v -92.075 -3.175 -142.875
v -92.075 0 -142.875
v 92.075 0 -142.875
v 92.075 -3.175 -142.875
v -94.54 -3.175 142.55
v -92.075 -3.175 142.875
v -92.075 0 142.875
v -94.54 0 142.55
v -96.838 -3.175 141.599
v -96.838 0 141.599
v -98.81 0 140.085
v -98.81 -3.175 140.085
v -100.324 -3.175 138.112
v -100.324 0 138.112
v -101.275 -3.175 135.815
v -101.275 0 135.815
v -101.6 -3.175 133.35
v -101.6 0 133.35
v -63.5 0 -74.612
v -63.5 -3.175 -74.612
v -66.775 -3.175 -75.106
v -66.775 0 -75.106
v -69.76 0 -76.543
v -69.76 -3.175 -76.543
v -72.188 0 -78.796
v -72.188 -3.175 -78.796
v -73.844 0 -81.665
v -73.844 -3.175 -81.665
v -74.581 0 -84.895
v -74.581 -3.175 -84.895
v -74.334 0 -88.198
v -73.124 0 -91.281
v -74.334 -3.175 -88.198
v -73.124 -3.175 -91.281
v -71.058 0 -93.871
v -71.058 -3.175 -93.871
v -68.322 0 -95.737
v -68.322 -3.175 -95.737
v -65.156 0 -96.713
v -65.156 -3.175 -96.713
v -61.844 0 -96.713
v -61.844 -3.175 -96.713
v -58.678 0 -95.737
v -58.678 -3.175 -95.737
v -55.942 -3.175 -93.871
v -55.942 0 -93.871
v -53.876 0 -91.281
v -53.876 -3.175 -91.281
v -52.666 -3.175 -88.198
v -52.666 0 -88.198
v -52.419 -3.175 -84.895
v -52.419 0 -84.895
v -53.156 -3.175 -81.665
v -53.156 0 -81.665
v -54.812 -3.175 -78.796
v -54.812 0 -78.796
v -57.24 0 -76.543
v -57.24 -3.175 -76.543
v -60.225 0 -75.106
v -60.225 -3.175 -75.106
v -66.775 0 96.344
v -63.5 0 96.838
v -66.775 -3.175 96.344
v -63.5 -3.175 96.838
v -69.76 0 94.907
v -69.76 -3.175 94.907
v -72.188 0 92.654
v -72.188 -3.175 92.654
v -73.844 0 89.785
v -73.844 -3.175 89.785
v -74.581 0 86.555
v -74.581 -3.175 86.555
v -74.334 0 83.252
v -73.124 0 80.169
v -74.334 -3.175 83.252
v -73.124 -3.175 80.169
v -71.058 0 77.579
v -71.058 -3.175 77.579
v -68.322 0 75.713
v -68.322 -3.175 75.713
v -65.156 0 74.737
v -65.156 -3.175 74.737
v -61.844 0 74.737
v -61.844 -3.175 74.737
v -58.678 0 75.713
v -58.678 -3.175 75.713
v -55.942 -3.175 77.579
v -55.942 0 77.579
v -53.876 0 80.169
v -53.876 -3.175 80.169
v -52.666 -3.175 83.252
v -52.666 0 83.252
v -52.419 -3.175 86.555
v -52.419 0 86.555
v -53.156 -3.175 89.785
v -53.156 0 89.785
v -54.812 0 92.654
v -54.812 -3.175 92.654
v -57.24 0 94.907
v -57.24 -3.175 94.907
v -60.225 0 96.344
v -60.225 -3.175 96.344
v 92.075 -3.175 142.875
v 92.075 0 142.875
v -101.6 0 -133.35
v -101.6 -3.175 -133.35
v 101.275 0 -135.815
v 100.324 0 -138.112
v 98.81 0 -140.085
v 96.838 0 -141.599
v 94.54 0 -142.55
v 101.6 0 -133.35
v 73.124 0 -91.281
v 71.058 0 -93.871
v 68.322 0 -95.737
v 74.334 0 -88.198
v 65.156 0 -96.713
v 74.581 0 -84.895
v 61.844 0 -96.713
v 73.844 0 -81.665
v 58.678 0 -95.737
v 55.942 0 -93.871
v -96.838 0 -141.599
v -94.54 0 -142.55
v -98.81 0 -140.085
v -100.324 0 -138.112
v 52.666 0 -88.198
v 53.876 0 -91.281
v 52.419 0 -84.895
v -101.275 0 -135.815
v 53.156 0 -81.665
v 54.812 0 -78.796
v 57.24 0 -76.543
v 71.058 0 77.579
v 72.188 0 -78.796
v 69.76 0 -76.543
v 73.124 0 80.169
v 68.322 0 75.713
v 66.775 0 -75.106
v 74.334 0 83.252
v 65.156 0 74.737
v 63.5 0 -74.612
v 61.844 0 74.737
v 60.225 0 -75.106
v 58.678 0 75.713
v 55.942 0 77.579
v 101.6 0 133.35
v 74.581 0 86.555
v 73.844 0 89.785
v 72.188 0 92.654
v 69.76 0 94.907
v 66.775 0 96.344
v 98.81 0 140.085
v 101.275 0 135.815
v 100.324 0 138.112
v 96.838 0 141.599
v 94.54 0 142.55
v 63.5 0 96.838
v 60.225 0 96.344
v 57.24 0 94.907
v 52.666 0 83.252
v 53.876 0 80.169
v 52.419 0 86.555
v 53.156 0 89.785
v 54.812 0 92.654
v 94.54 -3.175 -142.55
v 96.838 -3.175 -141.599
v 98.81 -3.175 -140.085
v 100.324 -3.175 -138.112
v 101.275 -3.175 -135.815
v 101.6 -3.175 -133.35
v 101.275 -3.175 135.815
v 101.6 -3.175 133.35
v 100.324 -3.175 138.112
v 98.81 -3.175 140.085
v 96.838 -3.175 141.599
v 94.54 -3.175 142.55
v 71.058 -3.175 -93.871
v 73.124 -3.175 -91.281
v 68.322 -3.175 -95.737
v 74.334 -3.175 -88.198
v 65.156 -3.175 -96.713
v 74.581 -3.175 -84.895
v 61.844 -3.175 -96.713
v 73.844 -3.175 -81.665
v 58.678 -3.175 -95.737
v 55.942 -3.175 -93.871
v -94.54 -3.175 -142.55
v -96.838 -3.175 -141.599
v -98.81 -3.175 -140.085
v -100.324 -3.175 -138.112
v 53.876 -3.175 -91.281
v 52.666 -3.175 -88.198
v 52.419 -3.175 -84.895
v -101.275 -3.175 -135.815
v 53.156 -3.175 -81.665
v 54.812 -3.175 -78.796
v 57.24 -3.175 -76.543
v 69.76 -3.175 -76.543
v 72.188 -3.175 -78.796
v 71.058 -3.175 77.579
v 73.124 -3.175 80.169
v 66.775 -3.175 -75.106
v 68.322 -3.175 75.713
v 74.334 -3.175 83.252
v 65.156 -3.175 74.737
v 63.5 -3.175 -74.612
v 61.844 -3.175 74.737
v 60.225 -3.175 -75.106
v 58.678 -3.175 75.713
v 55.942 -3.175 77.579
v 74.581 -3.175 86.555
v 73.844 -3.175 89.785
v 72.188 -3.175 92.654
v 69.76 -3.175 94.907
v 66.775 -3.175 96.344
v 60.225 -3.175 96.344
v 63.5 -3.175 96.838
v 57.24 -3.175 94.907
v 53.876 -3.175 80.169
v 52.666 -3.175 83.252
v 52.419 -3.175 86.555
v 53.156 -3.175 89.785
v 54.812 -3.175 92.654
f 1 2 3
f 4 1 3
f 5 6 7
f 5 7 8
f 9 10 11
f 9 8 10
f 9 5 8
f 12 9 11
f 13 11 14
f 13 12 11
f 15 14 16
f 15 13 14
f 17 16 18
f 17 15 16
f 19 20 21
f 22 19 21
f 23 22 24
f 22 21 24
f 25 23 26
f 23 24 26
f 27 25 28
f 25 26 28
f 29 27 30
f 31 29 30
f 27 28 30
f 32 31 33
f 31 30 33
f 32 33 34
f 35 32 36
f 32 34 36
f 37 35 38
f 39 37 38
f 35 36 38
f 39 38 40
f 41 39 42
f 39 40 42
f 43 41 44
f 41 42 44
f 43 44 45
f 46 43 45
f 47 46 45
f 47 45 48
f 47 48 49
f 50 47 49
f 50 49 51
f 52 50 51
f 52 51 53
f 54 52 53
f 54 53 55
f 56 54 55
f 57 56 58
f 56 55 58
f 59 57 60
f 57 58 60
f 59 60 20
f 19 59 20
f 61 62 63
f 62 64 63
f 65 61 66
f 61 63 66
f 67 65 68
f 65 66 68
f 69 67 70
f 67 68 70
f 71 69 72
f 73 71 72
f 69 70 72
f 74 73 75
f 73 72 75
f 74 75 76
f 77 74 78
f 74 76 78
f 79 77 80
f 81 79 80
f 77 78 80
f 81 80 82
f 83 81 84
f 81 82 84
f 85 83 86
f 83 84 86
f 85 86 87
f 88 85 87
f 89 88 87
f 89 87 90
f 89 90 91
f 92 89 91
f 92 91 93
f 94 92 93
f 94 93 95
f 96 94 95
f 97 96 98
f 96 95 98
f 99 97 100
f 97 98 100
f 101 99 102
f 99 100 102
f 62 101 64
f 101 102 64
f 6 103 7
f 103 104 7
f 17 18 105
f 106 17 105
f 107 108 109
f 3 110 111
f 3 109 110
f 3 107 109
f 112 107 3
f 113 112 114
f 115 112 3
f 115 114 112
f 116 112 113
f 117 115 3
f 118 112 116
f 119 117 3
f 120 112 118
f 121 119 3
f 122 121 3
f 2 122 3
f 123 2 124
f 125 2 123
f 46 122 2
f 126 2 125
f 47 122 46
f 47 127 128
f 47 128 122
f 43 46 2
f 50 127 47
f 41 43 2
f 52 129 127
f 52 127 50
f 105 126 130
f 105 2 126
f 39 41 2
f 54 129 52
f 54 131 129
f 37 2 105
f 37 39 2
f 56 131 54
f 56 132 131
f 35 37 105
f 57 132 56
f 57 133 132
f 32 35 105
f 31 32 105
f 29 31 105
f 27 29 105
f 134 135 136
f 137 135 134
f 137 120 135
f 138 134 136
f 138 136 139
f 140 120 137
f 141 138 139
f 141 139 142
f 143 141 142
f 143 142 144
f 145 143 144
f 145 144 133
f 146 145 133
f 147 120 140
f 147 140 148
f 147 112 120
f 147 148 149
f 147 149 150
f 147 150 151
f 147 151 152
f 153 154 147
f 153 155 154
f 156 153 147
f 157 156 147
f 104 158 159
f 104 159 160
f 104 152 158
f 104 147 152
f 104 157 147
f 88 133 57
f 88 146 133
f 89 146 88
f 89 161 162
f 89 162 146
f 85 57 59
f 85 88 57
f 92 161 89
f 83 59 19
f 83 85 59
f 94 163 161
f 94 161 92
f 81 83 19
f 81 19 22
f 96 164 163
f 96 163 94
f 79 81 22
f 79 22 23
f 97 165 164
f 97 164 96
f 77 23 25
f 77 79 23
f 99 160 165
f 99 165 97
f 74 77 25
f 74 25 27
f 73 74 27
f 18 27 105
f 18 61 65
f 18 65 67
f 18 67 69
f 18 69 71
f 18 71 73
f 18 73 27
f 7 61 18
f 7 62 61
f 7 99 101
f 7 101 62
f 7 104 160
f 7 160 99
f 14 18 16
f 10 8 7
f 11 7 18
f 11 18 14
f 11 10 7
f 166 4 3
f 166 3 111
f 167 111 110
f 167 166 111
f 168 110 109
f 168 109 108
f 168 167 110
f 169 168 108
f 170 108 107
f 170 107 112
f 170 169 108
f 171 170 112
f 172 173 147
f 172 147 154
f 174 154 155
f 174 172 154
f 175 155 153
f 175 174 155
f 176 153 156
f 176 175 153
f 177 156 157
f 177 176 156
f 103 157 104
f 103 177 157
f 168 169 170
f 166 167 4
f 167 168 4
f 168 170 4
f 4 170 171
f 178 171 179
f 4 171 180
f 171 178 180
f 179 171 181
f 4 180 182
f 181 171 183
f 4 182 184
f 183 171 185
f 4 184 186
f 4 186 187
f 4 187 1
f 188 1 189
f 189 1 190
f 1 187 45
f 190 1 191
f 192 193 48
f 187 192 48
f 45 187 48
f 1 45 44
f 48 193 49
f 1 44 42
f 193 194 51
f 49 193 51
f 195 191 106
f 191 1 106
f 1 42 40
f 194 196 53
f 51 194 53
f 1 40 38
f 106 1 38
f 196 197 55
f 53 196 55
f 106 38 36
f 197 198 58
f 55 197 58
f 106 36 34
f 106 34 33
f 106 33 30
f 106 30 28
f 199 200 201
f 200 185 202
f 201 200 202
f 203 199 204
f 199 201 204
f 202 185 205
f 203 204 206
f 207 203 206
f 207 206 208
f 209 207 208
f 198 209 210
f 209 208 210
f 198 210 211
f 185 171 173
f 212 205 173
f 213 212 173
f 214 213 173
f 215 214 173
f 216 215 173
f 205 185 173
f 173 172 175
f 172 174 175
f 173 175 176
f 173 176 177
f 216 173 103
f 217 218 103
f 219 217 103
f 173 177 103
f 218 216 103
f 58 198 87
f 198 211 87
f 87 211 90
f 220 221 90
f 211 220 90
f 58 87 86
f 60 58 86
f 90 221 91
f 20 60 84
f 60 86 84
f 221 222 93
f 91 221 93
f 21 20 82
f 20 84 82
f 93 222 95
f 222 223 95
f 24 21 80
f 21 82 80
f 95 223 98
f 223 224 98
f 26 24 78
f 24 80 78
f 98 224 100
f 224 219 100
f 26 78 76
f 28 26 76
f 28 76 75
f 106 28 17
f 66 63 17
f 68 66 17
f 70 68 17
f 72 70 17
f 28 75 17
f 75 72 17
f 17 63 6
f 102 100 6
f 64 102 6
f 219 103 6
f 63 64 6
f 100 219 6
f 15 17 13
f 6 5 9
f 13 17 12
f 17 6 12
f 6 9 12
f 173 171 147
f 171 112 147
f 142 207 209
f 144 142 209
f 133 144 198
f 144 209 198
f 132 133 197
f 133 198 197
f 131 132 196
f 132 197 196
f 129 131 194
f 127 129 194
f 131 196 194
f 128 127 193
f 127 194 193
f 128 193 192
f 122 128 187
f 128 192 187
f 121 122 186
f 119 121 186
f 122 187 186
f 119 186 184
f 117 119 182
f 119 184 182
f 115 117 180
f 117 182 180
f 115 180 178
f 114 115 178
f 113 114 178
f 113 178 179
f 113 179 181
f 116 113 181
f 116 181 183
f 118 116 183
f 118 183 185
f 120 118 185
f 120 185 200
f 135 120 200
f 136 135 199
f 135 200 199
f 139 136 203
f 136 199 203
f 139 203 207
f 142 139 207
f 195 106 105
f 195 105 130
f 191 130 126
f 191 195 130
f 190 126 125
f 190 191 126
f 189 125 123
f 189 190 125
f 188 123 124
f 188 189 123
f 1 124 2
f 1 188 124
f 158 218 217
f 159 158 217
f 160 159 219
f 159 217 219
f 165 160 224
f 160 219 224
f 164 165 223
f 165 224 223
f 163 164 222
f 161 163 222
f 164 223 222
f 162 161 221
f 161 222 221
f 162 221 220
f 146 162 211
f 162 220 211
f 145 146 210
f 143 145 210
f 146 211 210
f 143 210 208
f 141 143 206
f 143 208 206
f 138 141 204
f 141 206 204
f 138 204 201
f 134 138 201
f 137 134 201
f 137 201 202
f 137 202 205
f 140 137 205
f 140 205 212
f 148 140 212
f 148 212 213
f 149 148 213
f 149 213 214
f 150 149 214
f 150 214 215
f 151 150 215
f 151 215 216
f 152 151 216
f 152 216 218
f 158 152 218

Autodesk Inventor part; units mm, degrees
ref_plane "YZ Plane" through (0, 0, 0) normal (1, 0, 0) x (0, 1, 0)
ref_plane "XZ Plane" through (0, 0, 0) normal (0, 1, 0) x (-1, 0, 0)
ref_plane "XY Plane" through (0, 0, 0) normal (0, 0, 1) x (1, 0, 0)
sketch "Sketch1" plane through (0, 0, 0) normal (0, 1, 0) x (-1, 0, 0)
  line L0 (101.6, -142.875) -> (-101.6, -142.875)
  line L1 (-101.6, -142.875) -> (-101.6, 142.875)
  line L2 (-101.6, 142.875) -> (101.6, 142.875)
  line L3 (101.6, 142.875) -> (101.6, -142.875)
  line L4 (101.6, -142.875) -> (-101.6, 142.875) construction
  line L5 (-101.6, -142.875) -> (101.6, 142.875) construction
  point P0 (0, 0)
  dimension "d0" = 203.2
  dimension "d1" = 285.75
extrude "Extrusion1" add sketch "Sketch1" against normal blind 3.175
sketch "Sketch2" plane through (0, 0, 0) normal (0, 1, 0) x (1, 0, 0)
  line L0 (101.6, 142.875) -> (101.6, -142.875) construction
  line L1 (101.6, 0) -> (-101.6, 0) construction
  line L2 (-101.6, -142.875) -> (-101.6, 142.875) construction
  line L3 (-101.6, 142.875) -> (101.6, 142.875) construction
  line L4 (0, 142.875) -> (0, -142.875) construction
  point P0 (0, 0)
  point P1 (63.5, 85.725)
  point P2 (0, 0)
  point P3 (-63.5, 85.725)
  point P4 (63.5, -85.725)
  point P5 (-63.5, -85.725)
  point P6 (0, 0)
  dimension "d4" = 85.725
  dimension "d5" = 63.5
hole "Hole1" at (63.5, 0, -85.725) at (-63.5, 0, -85.725) at (63.5, 0, 85.725) at (-63.5, 0, 85.725) direction (0, -1, 0) diameter 22.225 end through all
fillet "Fillet1" radius 9.525 4 edges at (101.6, -1.5875, 142.875) (101.6, -1.5875, -142.875) (-101.6, -1.5875, 142.875) (-101.6, -1.5875, -142.875)
properties part number "GP2-001" material "Aluminum 6061"
